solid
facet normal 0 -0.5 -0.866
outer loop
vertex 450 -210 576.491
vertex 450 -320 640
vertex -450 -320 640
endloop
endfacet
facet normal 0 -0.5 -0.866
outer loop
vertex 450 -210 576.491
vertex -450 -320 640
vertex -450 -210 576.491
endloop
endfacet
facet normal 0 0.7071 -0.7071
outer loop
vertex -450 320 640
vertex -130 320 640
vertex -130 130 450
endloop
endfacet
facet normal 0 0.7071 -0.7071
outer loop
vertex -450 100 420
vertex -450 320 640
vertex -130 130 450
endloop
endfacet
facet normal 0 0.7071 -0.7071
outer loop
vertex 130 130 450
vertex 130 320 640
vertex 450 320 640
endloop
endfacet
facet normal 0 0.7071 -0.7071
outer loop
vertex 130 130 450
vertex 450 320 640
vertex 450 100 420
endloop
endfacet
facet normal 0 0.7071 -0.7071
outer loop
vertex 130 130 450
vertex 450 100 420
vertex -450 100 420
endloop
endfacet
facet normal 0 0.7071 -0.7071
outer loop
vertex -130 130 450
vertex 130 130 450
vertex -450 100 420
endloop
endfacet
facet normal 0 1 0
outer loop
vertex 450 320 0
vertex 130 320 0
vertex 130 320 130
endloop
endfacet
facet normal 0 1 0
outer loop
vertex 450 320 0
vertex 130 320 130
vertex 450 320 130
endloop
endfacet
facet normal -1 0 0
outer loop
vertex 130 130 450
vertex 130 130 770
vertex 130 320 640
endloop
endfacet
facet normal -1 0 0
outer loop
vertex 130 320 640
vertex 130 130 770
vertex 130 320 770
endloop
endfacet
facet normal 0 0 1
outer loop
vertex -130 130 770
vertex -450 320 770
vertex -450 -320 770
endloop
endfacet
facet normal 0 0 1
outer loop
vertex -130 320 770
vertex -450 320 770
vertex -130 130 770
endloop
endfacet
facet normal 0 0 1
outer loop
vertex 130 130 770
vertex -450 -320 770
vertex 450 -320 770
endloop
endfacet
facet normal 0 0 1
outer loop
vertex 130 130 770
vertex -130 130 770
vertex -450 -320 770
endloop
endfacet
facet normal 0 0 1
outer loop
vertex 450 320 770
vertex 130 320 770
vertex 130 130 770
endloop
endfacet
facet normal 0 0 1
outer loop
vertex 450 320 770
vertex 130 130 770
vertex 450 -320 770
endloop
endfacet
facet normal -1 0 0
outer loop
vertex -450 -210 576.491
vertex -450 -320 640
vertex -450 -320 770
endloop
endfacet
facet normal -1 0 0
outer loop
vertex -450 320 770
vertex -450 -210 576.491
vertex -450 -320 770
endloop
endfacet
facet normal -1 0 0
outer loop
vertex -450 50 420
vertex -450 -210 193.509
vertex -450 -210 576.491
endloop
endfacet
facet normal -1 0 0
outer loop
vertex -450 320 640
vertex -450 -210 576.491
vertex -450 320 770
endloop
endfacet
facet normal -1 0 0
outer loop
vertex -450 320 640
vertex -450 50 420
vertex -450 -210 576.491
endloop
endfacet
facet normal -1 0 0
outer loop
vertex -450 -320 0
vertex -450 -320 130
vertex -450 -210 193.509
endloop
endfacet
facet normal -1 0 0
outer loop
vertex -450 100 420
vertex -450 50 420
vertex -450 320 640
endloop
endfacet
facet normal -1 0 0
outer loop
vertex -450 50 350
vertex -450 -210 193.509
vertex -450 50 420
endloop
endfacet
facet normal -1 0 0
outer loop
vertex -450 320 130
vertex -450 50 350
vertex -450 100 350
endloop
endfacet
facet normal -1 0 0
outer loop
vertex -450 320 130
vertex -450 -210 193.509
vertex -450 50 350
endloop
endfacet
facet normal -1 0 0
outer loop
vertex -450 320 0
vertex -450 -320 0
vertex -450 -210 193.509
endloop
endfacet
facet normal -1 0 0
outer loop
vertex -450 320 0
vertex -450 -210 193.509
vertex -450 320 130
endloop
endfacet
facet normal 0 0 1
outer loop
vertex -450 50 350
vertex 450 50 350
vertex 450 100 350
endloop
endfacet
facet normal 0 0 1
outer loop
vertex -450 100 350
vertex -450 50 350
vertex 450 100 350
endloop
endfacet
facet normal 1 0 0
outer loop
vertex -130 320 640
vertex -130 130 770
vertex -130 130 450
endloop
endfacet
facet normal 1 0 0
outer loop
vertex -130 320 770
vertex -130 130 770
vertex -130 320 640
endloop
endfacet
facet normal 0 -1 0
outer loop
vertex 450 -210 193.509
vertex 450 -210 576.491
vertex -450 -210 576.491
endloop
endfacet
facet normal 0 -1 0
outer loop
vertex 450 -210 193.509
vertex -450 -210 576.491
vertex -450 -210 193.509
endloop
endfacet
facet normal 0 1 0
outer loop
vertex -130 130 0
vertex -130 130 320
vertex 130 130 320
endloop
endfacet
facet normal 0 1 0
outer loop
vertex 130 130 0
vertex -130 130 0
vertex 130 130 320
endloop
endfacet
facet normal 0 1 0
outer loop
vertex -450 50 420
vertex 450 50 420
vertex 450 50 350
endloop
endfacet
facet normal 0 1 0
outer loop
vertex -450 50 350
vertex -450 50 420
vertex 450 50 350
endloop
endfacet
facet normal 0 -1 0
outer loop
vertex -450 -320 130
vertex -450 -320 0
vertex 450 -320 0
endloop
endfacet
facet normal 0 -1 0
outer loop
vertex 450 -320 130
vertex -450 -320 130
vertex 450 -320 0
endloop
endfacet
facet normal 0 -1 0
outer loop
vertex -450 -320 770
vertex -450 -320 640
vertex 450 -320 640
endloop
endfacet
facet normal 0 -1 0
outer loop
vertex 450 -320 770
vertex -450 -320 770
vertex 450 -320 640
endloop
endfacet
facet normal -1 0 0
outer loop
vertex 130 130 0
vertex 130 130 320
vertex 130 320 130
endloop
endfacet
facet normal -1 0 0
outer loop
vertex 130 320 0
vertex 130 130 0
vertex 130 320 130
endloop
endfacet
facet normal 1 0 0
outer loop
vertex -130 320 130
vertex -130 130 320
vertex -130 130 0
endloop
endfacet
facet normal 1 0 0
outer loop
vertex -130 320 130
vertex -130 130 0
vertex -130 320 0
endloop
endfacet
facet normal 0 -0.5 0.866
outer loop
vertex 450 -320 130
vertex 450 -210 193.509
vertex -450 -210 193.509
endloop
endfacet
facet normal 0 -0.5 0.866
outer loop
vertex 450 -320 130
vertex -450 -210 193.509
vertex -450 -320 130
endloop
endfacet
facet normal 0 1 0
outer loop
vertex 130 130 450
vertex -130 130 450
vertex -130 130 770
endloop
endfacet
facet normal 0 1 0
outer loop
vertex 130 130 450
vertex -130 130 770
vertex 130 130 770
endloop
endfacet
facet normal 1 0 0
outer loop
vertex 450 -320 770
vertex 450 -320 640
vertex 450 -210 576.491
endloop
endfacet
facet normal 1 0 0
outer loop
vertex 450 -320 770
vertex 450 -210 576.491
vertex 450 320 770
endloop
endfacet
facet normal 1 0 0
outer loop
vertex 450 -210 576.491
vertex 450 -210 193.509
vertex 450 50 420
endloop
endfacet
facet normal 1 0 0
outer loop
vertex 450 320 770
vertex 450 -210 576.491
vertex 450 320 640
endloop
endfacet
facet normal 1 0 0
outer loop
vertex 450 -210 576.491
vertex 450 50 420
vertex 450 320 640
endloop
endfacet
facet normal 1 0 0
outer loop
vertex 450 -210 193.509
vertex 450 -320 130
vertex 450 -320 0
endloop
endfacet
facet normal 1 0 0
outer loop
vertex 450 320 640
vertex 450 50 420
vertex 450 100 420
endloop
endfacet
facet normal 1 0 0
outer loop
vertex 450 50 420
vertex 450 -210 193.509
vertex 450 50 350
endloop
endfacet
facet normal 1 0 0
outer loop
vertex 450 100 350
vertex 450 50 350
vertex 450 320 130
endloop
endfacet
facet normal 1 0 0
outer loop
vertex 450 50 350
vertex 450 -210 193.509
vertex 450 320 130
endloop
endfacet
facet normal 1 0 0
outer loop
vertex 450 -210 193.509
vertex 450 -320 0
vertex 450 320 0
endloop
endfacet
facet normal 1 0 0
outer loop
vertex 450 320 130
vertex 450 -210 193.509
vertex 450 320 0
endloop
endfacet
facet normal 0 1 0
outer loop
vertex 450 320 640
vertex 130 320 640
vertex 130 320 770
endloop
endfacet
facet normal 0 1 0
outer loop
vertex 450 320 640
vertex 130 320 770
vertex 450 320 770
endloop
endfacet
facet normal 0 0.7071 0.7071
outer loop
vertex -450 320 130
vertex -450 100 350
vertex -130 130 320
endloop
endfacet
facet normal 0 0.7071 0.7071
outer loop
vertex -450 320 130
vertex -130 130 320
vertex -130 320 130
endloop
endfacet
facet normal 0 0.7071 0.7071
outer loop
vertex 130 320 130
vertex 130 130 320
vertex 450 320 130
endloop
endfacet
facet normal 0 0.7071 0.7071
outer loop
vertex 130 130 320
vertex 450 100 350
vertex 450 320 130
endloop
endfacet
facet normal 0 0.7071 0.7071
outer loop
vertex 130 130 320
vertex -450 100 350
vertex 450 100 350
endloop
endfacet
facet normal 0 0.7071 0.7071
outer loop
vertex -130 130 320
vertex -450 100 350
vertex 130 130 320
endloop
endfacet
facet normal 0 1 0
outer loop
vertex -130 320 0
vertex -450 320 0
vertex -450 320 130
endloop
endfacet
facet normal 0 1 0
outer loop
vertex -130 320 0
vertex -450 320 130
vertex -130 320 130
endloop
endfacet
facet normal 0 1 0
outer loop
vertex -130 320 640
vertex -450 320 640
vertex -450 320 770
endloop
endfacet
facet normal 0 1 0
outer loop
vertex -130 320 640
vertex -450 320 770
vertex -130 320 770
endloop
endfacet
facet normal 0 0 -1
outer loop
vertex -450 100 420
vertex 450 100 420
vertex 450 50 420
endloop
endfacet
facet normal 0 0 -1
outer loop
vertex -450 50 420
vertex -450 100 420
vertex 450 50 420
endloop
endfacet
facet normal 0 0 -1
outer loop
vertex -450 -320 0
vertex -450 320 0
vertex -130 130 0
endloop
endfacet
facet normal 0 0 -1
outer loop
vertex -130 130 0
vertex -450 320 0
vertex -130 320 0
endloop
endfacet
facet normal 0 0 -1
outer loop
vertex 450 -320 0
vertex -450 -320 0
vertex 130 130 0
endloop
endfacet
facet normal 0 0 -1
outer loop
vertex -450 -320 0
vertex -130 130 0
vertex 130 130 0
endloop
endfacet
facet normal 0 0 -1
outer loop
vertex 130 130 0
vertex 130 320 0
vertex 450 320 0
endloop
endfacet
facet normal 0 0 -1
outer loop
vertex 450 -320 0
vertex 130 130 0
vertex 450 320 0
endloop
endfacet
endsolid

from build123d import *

# Parameters (mm, degrees)
IZIM6_W                     = 900
IZIM6_H                     = 640
Y_KSEKLIK_EKSTR_ZYON3_DEPTH = 770
IZIM7_W                     = 260
IZIM7_H                     = 190
KES_EKSTR_ZYON4_DEPTH       = 770
KES_EKSTR_ZYON6_REACH       = 1228.907
KES_EKSTR_ZYON7_DEPTH       = 900


with BuildPart() as part:
    # Çizim6 → Yükseklik-Ekstrüzyon3 (new body)
    with BuildSketch(Plane.XY):
        Rectangle(IZIM6_W, IZIM6_H)
    extrude(amount=Y_KSEKLIK_EKSTR_ZYON3_DEPTH)

    # Çizim7 → Kes-Ekstrüzyon4 (cut)
    with BuildSketch(Plane.XY.offset(770)):
        with Locations((0, 225)):
            Rectangle(IZIM7_W, IZIM7_H)
    extrude(amount=-KES_EKSTR_ZYON4_DEPTH, mode=Mode.SUBTRACT)

    # Kes-Ekstrüzyon6: up to this face of the body (flat: up to its plane)
    kes_ekstr_zyon6_end = Plane(part.part.faces().sort_by_distance((-450, 0, 385))[0])
    # Çizim8 → Kes-Ekstrüzyon6 (cut, up to the picked face)
    with BuildSketch(Plane(origin=(450, 0, 0), x_dir=(0, 0, -1), z_dir=(1, 0, 0)), mode=Mode.PRIVATE) as kes_ekstr_zyon6_sk1:
        Polygon((-350, 50), (-350, 100), (-130, 320), (-640, 320), (-420, 100), (-420, 50), align=None)
    kes_ekstr_zyon6_tool1 = split(extrude(kes_ekstr_zyon6_sk1.sketch, amount=-KES_EKSTR_ZYON6_REACH, mode=Mode.PRIVATE), bisect_by=kes_ekstr_zyon6_end, keep=Keep.BOTH, mode=Mode.PRIVATE)
    add(kes_ekstr_zyon6_tool1.solids().sort_by(Axis((450, 229.348687, 385), (-1, 0, 0)))[0], mode=Mode.SUBTRACT)

    # Çizim13 → Kes-Ekstrüzyon7 (cut)
    with BuildSketch(Plane(origin=(450, 0, 0), x_dir=(0, 0, -1), z_dir=(1, 0, 0))):
        Polygon((-640, -320), (-576.491470389, -210), (-193.508529611, -210), (-130, -320), align=None)
    extrude(amount=-KES_EKSTR_ZYON7_DEPTH, mode=Mode.SUBTRACT)


solid = part.part
